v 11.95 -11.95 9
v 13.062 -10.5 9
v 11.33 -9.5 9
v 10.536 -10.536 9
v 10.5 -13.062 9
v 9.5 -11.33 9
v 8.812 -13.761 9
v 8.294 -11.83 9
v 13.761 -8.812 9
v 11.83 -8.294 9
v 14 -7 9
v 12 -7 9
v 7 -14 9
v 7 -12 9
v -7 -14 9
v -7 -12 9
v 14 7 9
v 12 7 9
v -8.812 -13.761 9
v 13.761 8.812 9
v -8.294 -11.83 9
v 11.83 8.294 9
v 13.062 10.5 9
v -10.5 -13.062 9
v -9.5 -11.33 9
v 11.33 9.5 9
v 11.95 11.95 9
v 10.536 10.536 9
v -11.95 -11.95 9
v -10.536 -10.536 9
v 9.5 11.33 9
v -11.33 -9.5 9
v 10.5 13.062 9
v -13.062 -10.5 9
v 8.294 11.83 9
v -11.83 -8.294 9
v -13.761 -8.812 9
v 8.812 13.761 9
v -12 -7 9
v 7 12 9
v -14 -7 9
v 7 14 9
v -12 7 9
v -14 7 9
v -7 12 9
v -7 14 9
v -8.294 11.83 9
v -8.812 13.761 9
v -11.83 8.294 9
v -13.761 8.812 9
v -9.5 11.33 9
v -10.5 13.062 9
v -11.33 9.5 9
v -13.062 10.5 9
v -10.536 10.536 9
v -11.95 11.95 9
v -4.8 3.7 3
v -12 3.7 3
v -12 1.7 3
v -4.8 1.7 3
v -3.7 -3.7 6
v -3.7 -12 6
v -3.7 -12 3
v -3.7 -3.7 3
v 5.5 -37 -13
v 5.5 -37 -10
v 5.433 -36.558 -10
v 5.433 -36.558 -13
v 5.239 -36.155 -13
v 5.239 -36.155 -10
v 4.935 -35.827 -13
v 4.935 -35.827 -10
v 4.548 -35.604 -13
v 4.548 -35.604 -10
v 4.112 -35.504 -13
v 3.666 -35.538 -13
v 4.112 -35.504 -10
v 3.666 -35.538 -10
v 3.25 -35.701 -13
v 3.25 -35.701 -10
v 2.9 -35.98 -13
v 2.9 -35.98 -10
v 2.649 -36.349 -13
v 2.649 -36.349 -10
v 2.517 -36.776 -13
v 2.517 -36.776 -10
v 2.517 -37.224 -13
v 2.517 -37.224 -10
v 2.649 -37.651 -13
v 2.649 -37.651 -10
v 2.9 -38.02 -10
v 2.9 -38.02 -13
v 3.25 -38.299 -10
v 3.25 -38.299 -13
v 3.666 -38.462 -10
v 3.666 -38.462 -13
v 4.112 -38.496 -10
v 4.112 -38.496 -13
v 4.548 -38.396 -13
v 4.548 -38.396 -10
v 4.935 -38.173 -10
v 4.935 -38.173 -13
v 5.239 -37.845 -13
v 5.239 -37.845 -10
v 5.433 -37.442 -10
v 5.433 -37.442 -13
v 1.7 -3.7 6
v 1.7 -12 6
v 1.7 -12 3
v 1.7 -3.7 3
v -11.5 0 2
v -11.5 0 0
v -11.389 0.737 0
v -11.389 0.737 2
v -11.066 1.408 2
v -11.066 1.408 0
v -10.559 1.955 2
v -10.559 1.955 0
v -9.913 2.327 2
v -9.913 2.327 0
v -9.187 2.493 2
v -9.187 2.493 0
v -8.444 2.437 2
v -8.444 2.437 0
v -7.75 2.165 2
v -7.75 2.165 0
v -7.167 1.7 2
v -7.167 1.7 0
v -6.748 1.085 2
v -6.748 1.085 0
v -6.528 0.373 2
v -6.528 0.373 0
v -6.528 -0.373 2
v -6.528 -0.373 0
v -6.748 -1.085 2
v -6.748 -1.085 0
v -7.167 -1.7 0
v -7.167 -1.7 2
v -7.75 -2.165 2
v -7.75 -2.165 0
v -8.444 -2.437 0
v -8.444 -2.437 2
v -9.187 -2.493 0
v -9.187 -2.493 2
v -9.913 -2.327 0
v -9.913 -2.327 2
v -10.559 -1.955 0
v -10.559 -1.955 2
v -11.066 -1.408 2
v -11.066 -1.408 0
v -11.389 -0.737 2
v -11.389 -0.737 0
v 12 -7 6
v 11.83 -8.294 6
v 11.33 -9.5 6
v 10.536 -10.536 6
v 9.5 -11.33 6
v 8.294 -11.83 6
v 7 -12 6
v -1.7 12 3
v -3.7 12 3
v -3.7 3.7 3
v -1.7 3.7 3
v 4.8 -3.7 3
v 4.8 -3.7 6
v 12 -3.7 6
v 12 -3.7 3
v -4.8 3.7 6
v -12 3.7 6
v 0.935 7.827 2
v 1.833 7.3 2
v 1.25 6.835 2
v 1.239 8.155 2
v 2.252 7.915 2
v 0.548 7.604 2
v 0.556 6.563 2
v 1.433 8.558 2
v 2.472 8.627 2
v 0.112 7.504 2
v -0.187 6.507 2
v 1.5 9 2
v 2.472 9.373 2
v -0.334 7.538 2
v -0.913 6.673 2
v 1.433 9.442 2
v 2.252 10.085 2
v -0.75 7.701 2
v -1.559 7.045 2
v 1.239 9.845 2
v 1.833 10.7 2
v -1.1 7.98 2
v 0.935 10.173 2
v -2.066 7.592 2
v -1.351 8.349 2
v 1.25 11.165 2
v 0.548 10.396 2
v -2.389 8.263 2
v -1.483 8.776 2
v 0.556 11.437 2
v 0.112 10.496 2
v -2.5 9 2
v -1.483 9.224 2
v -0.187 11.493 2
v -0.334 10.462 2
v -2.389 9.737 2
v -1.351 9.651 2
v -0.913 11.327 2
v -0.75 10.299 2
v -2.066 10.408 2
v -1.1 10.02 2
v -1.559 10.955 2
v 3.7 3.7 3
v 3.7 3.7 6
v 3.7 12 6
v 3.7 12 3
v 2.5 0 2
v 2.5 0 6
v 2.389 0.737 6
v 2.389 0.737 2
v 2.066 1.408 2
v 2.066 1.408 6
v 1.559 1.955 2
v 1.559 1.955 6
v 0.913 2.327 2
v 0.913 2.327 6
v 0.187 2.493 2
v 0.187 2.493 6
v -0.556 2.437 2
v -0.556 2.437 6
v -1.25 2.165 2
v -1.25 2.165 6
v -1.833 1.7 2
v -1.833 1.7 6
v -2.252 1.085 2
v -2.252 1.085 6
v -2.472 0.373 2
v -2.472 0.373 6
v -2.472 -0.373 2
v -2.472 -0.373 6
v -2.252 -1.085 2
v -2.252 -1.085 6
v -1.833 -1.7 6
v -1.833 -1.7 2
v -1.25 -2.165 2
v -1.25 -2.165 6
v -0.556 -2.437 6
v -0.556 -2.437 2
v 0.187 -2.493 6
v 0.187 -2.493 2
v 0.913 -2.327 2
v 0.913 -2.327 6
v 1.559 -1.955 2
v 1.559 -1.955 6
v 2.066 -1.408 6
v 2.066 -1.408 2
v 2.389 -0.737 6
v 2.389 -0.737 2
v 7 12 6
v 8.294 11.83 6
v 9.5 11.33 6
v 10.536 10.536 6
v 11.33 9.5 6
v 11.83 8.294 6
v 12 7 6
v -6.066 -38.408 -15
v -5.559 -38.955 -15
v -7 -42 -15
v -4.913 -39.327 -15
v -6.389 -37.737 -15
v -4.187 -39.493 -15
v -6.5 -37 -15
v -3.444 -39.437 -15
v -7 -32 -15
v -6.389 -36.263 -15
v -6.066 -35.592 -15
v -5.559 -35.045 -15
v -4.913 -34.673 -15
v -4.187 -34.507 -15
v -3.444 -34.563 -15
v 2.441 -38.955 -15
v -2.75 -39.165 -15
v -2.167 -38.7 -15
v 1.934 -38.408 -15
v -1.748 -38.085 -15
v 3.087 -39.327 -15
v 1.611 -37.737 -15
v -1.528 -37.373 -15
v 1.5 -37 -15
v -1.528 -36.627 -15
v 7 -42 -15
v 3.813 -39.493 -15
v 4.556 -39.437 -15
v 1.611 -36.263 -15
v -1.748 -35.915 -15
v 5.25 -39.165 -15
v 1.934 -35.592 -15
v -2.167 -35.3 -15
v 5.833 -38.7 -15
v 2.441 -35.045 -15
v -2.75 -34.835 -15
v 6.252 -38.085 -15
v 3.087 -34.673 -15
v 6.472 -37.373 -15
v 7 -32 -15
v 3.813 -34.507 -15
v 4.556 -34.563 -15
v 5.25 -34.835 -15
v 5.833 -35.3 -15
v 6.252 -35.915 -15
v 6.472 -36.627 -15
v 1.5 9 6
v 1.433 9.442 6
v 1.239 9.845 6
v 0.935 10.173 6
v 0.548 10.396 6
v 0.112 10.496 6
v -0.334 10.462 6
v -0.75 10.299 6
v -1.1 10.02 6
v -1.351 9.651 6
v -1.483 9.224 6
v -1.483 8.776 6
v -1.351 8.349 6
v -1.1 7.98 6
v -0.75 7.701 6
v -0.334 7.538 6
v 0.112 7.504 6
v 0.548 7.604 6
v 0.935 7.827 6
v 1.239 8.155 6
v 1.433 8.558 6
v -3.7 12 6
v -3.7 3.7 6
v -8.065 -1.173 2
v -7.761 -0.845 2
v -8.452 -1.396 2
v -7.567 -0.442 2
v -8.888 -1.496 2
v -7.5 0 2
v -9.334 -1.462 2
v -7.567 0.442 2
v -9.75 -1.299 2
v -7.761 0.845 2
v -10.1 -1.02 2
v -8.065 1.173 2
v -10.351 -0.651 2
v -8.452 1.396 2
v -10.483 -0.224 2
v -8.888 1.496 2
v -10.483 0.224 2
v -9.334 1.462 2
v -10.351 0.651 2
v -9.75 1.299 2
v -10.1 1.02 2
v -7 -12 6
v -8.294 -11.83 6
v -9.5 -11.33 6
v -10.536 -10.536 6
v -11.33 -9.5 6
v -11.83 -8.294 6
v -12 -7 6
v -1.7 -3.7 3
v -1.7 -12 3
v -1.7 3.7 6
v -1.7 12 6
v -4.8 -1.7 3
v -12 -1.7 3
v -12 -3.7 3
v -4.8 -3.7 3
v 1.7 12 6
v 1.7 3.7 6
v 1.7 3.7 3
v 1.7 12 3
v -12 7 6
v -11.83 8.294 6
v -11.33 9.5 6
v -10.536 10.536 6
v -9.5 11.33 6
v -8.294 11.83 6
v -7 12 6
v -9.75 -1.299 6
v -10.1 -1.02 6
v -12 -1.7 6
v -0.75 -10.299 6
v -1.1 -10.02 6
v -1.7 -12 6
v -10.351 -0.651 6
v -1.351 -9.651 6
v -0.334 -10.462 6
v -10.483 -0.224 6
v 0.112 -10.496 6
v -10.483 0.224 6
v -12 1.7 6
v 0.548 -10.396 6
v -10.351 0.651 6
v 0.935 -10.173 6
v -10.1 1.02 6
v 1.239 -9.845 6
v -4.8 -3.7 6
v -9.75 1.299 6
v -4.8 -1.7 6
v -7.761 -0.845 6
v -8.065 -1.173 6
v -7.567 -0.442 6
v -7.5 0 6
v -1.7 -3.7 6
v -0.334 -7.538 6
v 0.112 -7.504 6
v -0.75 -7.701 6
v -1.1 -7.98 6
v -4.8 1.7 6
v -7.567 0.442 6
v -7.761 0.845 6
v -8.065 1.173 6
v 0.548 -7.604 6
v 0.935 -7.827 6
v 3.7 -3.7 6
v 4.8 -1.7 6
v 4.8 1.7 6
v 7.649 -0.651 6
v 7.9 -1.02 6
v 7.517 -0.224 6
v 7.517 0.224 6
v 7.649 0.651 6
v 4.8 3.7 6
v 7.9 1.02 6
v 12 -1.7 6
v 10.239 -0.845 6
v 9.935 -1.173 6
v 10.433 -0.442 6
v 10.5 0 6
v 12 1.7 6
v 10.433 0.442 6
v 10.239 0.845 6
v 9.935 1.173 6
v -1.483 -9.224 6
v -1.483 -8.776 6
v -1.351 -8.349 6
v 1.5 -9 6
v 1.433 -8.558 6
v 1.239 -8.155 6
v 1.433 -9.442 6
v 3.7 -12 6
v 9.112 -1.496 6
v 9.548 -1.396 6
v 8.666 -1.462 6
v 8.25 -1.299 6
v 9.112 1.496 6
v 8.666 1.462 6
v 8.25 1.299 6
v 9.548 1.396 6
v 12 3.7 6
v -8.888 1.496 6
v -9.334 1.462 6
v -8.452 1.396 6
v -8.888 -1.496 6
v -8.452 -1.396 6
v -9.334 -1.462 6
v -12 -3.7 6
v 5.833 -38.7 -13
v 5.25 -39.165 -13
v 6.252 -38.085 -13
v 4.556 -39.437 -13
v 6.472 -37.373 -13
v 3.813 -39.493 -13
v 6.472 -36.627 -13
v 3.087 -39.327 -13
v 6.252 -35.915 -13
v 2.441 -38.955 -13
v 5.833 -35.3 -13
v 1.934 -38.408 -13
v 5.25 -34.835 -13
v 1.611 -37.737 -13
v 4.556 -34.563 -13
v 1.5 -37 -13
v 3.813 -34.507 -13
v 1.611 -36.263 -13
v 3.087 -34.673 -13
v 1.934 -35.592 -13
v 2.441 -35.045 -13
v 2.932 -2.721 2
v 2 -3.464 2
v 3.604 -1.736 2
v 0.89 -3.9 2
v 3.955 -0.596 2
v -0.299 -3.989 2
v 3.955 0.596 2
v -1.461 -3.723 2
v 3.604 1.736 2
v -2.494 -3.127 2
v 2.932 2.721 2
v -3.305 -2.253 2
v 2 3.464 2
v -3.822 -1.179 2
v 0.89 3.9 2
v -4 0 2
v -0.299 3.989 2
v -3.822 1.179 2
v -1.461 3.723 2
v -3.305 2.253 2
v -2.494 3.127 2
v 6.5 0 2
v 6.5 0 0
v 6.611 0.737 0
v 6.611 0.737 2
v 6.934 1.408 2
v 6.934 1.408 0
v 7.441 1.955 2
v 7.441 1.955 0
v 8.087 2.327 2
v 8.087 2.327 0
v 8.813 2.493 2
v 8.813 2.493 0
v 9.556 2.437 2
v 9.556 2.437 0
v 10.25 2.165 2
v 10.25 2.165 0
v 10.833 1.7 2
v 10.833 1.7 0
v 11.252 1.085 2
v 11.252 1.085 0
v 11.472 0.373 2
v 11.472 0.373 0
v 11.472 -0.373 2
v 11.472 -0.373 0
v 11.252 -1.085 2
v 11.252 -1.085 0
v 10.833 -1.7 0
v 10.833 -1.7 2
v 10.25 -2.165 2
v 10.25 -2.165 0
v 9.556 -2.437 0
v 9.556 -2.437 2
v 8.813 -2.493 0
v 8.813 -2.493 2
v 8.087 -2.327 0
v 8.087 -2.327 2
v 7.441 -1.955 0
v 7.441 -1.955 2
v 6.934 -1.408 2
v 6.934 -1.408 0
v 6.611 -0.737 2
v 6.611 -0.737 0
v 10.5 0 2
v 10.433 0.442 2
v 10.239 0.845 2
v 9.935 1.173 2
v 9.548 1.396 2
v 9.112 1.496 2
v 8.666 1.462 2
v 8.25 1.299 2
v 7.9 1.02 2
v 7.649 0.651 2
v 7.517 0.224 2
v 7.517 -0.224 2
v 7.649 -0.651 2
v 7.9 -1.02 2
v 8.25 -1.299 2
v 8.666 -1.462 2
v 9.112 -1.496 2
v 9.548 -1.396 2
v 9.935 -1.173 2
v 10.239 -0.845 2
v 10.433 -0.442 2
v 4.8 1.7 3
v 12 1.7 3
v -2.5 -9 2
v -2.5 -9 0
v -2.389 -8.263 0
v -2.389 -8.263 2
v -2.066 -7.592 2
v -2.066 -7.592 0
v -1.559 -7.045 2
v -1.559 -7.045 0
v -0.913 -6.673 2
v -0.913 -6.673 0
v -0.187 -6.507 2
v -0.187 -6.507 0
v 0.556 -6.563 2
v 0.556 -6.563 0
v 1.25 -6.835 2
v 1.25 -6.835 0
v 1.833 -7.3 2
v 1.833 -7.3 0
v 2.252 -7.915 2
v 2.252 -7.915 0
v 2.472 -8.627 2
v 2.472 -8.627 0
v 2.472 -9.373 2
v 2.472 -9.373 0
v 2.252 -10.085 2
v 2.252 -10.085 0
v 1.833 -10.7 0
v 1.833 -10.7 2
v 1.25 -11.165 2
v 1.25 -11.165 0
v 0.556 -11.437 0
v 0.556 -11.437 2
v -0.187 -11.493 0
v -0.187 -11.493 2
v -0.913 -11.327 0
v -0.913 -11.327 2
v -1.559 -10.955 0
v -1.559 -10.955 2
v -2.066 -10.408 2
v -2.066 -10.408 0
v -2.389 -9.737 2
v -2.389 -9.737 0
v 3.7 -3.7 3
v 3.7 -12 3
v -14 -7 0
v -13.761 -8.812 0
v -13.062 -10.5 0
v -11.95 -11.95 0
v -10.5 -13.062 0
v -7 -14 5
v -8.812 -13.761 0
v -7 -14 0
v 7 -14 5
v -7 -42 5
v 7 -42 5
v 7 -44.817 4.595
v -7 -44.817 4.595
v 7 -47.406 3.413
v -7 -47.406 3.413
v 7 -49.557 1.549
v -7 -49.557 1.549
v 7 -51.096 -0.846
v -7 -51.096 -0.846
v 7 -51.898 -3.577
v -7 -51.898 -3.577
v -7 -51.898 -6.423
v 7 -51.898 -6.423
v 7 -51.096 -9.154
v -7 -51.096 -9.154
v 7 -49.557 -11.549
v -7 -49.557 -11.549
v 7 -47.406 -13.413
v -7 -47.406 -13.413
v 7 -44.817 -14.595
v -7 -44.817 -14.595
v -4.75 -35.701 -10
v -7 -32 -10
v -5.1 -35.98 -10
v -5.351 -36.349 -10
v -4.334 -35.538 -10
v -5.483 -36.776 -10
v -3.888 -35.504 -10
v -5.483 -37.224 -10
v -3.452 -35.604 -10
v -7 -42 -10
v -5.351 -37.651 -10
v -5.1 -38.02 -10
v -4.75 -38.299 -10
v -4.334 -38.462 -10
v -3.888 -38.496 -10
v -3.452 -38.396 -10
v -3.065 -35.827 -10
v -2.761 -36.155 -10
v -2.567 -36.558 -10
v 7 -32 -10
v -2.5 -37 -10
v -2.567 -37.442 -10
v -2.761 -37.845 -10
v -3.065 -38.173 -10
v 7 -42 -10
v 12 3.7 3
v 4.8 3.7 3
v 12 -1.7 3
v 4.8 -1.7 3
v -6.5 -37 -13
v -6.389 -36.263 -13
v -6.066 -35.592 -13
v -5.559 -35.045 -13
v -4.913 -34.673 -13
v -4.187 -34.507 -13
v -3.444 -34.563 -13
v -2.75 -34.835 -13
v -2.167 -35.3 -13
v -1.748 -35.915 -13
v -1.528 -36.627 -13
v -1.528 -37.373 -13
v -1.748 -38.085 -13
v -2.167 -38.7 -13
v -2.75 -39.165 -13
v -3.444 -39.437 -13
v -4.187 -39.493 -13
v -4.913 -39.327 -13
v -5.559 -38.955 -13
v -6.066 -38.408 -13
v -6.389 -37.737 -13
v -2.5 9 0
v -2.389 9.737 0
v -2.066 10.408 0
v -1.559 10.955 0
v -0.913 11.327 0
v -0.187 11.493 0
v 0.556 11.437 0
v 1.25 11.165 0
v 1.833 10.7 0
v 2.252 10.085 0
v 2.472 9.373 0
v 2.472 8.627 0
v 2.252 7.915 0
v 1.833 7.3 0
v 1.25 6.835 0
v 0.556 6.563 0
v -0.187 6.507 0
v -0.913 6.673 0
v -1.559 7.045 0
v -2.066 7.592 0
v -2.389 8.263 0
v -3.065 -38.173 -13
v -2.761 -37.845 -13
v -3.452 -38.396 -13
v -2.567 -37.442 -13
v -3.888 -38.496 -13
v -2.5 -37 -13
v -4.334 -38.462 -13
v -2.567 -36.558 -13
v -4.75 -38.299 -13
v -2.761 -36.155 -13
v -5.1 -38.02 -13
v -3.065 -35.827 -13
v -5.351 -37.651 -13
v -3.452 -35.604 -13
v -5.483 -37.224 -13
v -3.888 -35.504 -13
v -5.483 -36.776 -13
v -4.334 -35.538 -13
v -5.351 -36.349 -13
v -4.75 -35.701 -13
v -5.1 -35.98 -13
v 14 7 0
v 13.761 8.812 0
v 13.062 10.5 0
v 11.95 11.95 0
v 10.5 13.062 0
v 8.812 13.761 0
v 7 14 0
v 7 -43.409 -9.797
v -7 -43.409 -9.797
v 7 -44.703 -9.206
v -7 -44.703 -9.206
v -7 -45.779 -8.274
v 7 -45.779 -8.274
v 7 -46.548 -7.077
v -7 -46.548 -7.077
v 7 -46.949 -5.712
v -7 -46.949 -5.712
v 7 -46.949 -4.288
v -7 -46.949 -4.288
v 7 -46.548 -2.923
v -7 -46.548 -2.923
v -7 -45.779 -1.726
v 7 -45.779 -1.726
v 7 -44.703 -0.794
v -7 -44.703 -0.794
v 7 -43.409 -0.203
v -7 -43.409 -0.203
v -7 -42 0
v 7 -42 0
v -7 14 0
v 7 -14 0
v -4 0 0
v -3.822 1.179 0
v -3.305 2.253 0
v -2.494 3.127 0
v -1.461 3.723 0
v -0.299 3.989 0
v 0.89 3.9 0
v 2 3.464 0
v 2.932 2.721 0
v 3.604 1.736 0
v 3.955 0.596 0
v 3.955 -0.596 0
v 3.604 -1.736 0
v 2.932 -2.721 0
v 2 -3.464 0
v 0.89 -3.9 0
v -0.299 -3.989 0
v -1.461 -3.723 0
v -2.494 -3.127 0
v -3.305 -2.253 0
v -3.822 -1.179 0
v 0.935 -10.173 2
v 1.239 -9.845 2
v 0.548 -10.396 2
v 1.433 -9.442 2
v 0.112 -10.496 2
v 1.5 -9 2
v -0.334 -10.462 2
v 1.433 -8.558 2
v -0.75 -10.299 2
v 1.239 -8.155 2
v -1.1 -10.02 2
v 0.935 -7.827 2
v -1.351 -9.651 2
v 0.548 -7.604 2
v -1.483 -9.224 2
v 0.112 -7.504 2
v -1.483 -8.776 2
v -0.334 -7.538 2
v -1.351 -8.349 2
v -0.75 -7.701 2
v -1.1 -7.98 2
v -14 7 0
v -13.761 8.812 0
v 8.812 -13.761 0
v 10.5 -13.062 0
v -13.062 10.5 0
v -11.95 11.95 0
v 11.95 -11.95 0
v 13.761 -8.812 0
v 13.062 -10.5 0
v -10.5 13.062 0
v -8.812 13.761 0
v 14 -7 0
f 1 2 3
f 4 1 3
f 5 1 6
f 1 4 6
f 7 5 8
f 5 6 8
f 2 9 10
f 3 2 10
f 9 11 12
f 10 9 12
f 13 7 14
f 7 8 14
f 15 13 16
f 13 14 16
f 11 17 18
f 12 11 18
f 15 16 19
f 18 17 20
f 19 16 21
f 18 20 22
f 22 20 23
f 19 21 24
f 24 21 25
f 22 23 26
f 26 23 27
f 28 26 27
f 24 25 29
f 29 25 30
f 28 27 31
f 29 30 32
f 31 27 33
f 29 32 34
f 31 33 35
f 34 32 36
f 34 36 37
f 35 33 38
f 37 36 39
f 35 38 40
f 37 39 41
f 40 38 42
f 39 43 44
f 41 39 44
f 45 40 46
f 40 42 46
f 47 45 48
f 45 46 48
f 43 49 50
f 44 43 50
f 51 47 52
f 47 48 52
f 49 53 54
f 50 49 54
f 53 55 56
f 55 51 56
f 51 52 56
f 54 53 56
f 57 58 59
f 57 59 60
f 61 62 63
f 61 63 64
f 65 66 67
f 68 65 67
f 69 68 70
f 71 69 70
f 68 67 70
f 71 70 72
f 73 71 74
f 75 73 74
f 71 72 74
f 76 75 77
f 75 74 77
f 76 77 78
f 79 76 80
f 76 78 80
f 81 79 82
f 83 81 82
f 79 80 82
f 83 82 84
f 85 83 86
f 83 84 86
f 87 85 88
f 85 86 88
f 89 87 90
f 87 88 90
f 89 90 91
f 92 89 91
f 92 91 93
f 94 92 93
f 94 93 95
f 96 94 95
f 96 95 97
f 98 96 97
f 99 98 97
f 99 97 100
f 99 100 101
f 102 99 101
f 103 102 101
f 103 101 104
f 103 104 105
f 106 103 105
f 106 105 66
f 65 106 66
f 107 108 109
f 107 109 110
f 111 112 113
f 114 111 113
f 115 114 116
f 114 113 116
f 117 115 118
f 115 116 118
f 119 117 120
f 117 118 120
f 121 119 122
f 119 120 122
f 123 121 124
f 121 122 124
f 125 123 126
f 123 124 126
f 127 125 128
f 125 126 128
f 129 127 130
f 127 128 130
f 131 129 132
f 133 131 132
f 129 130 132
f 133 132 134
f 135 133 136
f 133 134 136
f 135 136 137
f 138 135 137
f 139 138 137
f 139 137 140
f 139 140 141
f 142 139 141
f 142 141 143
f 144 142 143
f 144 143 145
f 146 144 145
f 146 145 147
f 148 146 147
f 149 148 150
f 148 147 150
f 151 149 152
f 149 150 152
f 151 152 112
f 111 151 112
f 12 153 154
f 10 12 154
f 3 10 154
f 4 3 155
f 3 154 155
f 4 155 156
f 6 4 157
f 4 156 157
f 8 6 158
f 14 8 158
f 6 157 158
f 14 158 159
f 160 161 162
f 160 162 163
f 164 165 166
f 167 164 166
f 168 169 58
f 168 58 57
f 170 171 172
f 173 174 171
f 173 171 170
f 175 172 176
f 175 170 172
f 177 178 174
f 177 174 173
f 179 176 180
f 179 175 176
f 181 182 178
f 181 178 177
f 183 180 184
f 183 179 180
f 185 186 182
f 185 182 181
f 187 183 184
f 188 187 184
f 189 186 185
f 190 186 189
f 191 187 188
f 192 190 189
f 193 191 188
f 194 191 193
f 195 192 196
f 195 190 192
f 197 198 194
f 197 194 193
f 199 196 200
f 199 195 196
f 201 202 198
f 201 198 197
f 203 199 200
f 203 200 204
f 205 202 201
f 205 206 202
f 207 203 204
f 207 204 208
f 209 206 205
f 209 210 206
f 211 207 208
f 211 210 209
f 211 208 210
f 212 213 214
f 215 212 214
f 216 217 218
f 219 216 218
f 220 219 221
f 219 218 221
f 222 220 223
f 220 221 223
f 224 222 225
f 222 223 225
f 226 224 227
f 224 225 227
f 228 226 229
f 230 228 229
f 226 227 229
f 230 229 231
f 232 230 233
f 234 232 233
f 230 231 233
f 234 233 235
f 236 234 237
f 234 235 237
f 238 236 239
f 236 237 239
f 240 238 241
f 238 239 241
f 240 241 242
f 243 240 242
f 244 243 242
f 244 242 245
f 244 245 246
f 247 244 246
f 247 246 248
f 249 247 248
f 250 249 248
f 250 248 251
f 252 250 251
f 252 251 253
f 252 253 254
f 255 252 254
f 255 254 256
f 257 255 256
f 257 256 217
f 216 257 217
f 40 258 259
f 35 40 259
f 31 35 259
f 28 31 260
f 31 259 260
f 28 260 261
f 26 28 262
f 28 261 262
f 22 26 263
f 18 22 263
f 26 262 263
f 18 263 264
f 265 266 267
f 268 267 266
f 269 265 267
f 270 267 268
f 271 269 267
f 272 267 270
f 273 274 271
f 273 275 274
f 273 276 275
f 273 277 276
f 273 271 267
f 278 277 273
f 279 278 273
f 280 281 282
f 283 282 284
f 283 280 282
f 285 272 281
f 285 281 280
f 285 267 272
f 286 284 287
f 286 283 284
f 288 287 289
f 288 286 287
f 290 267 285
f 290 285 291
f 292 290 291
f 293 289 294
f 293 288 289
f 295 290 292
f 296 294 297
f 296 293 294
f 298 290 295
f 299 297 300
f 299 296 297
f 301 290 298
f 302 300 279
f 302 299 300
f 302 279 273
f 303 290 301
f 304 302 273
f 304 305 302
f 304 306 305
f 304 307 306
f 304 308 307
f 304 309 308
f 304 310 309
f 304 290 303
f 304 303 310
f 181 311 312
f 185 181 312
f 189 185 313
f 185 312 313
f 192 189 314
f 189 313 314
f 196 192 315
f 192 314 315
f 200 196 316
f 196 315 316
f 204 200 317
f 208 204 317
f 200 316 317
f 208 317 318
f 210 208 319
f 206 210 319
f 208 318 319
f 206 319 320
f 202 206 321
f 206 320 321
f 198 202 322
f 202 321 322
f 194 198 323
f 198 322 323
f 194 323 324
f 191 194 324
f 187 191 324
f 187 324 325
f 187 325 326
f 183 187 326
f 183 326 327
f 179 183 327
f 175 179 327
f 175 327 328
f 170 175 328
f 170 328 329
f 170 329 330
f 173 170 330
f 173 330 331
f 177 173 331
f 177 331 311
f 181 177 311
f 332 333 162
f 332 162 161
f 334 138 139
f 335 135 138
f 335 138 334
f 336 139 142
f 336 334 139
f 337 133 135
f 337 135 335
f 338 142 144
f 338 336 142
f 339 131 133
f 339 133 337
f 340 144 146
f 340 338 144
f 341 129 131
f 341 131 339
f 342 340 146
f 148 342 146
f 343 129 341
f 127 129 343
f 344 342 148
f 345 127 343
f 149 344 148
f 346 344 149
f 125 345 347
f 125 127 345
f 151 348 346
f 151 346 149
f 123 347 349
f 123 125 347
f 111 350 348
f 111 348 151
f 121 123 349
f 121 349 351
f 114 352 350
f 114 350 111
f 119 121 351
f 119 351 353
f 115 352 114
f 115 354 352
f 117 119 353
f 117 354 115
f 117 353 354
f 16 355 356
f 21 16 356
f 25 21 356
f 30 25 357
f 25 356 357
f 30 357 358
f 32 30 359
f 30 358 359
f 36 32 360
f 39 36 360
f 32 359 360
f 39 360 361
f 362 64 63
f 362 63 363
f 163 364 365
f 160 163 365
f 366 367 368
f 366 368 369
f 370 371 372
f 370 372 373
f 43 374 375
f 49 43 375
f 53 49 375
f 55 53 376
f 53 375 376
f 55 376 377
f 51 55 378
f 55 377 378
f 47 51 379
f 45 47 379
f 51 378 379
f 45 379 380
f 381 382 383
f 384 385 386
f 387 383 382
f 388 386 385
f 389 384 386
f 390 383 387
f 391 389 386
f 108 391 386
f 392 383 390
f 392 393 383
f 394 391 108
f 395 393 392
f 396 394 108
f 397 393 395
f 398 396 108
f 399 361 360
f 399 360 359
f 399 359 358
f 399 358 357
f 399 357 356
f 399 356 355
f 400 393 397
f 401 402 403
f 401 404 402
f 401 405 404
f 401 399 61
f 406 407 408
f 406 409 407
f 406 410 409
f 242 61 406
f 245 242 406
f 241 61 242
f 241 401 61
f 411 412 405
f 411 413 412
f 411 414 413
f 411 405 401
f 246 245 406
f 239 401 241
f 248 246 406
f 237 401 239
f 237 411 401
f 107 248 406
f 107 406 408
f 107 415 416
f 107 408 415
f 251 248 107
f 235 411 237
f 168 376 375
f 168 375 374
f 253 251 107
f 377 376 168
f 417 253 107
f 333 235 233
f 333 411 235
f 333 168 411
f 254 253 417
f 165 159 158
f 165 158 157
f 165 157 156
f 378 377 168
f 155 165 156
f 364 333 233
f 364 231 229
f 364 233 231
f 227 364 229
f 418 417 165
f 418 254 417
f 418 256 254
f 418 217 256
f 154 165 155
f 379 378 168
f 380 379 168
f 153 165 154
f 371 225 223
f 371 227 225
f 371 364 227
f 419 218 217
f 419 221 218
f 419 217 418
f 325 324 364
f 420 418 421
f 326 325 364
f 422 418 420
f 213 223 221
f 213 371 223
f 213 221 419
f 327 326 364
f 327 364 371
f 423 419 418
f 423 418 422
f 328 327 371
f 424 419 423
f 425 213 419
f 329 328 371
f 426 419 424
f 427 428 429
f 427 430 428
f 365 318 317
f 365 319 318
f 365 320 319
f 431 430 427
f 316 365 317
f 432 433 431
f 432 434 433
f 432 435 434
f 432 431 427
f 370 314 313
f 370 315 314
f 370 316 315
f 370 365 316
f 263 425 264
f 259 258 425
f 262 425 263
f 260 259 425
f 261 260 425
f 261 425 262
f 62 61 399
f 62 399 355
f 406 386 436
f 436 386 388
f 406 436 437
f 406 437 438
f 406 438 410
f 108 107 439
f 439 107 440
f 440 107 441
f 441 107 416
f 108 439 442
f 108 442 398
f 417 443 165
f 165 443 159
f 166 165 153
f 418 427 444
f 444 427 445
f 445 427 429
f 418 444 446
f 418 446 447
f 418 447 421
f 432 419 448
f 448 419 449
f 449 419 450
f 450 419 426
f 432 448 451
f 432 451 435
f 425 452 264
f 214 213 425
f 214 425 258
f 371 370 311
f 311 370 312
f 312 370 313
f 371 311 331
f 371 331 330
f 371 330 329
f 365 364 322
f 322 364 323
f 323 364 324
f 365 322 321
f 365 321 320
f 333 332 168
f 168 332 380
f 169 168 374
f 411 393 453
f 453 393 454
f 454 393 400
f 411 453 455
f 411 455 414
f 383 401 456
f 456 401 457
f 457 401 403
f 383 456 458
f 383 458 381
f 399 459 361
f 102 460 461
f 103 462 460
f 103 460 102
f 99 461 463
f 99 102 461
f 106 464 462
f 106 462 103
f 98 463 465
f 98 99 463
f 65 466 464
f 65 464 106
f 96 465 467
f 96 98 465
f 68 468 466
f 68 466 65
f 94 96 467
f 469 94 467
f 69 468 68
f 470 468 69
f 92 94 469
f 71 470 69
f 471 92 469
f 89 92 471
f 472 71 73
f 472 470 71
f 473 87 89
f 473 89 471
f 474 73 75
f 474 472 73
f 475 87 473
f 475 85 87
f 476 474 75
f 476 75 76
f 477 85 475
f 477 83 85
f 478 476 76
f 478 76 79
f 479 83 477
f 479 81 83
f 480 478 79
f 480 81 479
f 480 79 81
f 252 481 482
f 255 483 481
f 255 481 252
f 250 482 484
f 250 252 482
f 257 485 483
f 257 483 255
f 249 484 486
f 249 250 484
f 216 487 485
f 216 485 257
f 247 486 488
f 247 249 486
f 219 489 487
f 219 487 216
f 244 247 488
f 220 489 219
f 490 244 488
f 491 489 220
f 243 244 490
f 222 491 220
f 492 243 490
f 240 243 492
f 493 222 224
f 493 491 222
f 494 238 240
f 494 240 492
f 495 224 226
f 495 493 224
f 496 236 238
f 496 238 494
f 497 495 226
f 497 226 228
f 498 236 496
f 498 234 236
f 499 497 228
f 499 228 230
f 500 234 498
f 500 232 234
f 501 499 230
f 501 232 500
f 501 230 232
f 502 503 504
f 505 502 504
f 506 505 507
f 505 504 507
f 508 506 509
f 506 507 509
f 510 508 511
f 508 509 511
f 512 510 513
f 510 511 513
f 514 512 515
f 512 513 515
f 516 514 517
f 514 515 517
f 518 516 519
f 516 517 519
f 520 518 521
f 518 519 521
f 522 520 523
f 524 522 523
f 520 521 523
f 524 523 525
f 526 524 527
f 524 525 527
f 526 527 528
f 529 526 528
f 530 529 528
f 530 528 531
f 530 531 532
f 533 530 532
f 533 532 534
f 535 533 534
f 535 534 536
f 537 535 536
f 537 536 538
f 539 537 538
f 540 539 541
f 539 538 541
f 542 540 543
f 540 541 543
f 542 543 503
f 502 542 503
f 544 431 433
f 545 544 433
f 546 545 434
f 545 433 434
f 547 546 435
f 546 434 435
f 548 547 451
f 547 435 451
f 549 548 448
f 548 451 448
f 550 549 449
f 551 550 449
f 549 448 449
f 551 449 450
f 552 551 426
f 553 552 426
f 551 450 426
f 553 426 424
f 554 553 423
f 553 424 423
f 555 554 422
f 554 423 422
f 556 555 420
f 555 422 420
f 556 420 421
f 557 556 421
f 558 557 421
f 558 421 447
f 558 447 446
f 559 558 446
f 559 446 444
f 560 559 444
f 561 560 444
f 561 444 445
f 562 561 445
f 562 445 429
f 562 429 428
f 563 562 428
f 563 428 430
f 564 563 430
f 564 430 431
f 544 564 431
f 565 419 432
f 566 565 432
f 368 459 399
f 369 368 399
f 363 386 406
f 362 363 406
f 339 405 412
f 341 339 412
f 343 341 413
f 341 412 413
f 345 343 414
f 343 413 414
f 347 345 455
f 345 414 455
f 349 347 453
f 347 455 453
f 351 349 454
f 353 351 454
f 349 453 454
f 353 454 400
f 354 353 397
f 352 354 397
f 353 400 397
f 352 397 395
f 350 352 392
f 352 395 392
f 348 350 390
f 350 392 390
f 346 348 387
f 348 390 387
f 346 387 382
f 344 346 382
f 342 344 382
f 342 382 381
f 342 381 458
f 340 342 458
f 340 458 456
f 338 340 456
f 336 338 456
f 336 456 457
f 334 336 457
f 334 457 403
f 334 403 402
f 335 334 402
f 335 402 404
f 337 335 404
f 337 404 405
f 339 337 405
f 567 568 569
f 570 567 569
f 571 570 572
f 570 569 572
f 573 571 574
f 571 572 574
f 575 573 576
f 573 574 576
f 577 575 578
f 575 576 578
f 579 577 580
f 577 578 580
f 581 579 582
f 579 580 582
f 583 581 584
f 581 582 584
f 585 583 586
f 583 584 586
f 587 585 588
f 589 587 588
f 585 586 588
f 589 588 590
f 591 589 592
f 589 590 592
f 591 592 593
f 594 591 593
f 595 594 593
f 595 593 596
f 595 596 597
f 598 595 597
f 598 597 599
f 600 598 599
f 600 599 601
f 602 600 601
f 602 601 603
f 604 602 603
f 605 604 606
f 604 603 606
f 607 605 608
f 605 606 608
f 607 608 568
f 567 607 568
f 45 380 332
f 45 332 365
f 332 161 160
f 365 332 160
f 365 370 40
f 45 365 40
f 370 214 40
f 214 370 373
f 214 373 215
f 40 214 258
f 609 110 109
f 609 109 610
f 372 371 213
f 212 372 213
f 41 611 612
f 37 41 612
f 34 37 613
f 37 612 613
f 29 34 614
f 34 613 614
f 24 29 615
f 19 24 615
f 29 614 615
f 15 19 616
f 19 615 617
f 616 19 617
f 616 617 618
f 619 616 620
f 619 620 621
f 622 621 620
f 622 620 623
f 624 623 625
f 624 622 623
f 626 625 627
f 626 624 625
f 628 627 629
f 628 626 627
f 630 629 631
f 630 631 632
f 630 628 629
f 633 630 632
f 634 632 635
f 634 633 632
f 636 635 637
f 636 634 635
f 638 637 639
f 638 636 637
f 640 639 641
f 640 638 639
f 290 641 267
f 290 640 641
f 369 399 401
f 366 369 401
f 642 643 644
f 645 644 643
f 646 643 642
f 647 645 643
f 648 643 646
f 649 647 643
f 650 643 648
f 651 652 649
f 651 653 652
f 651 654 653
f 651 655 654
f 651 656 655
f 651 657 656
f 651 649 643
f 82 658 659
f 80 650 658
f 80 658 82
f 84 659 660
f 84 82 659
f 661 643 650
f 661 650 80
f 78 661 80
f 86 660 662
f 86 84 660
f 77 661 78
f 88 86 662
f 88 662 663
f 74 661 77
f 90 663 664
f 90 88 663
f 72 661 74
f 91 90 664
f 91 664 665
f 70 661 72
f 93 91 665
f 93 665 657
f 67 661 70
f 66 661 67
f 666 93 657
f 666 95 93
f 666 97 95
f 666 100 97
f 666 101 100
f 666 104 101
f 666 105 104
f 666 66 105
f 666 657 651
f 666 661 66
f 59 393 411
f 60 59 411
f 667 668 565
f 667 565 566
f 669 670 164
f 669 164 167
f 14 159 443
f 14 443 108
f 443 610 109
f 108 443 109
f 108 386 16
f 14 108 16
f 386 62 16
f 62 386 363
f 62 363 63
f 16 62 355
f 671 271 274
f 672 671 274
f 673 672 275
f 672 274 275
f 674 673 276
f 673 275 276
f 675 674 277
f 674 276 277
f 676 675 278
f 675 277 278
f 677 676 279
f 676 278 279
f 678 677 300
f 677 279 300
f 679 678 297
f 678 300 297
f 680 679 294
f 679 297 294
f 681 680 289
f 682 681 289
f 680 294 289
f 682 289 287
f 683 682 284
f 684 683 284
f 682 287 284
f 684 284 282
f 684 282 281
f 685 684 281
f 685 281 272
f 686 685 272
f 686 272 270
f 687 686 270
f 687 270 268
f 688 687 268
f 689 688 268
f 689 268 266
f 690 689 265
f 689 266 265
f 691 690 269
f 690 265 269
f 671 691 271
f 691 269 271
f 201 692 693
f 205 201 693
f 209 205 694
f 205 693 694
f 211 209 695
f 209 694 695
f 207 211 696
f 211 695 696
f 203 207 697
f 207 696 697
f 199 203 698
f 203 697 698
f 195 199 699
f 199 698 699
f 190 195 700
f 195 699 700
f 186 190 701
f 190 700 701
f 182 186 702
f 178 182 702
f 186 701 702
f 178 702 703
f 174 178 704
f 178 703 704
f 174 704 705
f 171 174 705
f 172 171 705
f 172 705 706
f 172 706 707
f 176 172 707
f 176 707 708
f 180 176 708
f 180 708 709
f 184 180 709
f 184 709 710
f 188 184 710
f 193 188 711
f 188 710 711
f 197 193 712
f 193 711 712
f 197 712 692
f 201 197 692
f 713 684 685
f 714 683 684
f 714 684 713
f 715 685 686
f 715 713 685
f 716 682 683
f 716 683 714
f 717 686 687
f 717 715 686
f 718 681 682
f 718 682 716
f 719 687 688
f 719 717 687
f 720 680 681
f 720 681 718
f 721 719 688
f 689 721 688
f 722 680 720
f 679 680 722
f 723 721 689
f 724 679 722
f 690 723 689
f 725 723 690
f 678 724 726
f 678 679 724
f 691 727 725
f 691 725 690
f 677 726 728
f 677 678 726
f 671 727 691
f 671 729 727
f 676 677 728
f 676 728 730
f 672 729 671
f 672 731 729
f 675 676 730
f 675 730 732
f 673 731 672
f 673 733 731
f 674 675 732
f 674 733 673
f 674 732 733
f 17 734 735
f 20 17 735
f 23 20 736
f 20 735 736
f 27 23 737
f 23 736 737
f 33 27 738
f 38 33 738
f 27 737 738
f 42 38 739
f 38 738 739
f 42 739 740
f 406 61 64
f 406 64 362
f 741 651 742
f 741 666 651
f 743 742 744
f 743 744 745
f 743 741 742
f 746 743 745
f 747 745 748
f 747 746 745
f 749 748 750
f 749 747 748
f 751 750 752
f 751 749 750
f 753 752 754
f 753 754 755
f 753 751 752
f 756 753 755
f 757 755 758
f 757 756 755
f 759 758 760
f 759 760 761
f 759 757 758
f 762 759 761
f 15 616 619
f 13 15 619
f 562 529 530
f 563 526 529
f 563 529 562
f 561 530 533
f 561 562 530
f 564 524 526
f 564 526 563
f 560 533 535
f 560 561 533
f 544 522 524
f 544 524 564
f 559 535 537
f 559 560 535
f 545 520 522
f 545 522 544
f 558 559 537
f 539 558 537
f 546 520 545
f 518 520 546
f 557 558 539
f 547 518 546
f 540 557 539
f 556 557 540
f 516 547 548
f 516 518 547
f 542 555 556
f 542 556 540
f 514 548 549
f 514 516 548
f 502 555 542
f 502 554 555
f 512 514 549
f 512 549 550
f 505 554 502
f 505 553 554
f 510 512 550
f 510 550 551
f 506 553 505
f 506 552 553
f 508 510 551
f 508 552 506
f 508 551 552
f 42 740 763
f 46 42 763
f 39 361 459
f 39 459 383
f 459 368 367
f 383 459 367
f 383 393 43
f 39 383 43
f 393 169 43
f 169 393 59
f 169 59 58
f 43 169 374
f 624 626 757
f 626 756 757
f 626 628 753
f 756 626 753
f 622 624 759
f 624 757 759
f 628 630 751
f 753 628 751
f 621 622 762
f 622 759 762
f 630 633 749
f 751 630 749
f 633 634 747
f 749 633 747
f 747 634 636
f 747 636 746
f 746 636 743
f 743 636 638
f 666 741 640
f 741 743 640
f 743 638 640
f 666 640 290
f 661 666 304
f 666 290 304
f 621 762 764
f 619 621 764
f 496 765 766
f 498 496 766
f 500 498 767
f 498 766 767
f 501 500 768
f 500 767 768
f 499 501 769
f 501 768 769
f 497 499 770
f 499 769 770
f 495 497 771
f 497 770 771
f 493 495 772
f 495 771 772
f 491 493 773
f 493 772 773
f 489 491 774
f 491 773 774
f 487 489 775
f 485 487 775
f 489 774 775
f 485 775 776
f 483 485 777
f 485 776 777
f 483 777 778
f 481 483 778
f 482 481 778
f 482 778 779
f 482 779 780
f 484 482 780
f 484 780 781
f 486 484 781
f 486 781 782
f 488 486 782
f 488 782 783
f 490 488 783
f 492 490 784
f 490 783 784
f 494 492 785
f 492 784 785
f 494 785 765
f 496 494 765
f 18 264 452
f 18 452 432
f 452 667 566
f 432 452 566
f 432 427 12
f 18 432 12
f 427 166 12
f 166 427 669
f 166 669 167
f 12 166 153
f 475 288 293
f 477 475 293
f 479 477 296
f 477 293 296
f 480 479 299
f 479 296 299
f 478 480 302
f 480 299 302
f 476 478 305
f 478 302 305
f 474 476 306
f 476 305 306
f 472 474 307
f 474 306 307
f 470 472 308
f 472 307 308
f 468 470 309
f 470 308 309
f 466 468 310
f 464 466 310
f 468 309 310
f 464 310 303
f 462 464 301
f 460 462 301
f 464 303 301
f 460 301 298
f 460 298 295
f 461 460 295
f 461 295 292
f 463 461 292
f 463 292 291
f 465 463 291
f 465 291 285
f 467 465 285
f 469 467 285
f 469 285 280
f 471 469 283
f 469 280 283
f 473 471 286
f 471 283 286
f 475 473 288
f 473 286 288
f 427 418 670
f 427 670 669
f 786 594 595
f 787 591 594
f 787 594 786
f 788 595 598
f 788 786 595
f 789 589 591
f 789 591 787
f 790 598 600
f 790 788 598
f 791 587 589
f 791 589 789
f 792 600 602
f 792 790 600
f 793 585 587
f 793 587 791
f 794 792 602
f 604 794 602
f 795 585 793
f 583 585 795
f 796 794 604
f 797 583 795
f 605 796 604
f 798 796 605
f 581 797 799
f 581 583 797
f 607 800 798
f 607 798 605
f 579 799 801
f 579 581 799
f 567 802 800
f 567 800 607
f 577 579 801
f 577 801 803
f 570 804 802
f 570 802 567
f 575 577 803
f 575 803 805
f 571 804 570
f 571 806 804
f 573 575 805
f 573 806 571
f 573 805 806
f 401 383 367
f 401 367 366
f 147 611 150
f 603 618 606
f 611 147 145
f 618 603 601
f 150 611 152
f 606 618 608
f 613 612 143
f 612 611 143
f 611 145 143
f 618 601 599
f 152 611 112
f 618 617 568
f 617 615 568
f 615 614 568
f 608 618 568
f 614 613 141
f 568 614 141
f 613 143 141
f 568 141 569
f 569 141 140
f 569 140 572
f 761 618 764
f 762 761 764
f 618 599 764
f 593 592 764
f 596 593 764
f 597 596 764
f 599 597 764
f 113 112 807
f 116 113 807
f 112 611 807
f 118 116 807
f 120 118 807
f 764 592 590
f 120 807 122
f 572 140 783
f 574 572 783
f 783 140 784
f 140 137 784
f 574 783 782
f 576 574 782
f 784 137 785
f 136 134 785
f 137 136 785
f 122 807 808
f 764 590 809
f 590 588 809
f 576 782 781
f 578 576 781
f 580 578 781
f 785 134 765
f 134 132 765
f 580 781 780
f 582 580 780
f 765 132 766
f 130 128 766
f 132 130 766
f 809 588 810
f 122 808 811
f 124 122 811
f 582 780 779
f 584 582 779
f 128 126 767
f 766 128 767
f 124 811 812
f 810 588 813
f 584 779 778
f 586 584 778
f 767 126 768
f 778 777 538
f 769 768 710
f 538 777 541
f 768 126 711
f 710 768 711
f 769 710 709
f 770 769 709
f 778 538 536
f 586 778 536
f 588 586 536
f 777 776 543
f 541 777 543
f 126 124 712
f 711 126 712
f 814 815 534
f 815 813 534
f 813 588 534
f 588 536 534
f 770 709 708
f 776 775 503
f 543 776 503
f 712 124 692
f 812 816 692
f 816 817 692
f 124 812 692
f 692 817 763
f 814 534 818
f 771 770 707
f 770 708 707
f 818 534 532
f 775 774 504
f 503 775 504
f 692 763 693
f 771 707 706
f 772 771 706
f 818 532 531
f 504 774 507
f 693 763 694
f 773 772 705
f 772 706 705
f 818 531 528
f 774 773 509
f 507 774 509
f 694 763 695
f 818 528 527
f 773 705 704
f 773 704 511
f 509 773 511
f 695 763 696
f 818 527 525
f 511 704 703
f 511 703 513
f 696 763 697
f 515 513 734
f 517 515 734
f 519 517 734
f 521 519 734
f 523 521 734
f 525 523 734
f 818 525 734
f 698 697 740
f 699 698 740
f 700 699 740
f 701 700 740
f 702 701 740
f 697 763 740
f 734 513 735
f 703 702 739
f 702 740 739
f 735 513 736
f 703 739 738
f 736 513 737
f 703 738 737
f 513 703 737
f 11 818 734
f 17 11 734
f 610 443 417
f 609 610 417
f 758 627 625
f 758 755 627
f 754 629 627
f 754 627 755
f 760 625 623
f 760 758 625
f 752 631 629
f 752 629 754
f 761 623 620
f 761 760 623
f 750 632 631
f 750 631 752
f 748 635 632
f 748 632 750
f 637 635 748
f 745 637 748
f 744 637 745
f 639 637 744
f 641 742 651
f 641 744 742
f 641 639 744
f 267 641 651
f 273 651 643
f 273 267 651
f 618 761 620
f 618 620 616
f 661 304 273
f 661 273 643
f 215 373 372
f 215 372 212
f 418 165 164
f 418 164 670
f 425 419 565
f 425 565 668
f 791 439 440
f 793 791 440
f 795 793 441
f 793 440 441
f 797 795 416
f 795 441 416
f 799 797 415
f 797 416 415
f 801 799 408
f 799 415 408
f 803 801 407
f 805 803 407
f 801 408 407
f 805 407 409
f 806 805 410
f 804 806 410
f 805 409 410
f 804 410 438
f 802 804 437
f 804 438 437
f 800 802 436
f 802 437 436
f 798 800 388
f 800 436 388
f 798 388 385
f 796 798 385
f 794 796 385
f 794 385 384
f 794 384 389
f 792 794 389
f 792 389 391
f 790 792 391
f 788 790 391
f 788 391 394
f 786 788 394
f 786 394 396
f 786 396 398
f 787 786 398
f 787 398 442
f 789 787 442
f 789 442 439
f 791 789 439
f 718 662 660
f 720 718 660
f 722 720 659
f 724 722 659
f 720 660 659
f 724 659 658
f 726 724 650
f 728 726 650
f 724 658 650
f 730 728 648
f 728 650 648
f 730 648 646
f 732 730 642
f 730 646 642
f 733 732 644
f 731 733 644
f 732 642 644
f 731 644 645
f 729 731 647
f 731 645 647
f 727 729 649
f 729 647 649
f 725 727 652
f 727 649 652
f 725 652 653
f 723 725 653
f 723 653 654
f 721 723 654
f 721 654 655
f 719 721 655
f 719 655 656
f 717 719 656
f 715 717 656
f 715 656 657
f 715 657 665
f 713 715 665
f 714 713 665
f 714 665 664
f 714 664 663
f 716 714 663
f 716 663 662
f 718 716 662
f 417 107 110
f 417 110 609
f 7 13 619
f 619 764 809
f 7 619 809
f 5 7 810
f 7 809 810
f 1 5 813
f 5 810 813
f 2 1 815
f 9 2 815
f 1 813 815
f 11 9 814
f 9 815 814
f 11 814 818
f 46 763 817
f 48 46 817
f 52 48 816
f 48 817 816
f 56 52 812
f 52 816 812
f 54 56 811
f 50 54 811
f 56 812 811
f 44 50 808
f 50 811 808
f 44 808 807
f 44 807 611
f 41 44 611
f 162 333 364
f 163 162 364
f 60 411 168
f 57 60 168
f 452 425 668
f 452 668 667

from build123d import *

# Parameters (mm, degrees)
Y_KSEKLIK_EKSTR_ZYON1_DEPTH = 9
Y_KSEKLIK_EKSTR_ZYON2_DEPTH = 6
IZIM4_R                     = 1.5
IZIM4_R_2                   = 2.5
KES_EKSTR_ZYON2_DEPTH       = 6.5
IZIM5_W                     = 14
IZIM5_H                     = 15
Y_KSEKLIK_EKSTR_ZYON3_DEPTH = 5
Y_KSEKLIK_EKSTR_ZYON4_DEPTH = 7
IZIM3_W                     = 7.2
IZIM3_H                     = 2
IZIM3_W_2                   = 2
IZIM3_H_2                   = 8.3
KES_EKSTR_ZYON3_DEPTH       = 3
IZIM8_R                     = 1.5
KES_EKSTR_ZYON5_DEPTH       = 10
IZIM9_R                     = 2.5
IZIM9_R_2                   = 4
KES_EKSTR_ZYON6_DEPTH       = 2
IZIM11_R                    = 2.5
KES_EKSTR_ZYON8_DEPTH       = 2
KES_EKSTR_ZYON9_START       = -10
KES_EKSTR_ZYON9_DEPTH       = 10
IZIM14_W                    = 14
IZIM14_H                    = 3
Y_KSEKLIK_EKSTR_ZYON5_DEPTH = 5


with BuildPart() as part:
    # Çizim1 → Yükseklik-Ekstrüzyon1 (new body)
    with BuildSketch(Plane.XY):
        with BuildLine():
            Line((17, 7), (17, -7))
            ThreePointArc((17, -7), (14.071067812, -14.071067812), (7, -17))
            Line((7, -17), (-7, -17))
            ThreePointArc((-7, -17), (-14.071067812, -14.071067812), (-17, -7))
            Line((-17, -7), (-17, 7))
            ThreePointArc((-17, 7), (-14.071067812, 14.071067812), (-7, 17))
            Line((-7, 17), (7, 17))
            ThreePointArc((7, 17), (14.071067812, 14.071067812), (17, 7))
        make_face()
        with BuildLine():
            Line((-7, 12), (7, 12))
            ThreePointArc((7, 12), (10.535533906, 10.535533906), (12, 7))
            Line((12, 7), (12, -7))
            ThreePointArc((12, -7), (10.535533906, -10.535533906), (7, -12))
            Line((7, -12), (-7, -12))
            ThreePointArc((-7, -12), (-10.535533906, -10.535533906), (-12, -7))
            Line((-12, -7), (-12, 7))
            ThreePointArc((-12, 7), (-10.535533906, 10.535533906), (-7, 12))
        make_face(mode=Mode.SUBTRACT)
    extrude(amount=Y_KSEKLIK_EKSTR_ZYON1_DEPTH)

    # Çizim2 → Yükseklik-Ekstrüzyon2 (add)
    with BuildSketch(Plane.XY):
        with BuildLine():
            Line((-7, -12), (7, -12))
            ThreePointArc((7, -12), (10.535533906, -10.535533906), (12, -7))
            Line((12, -7), (12, 7))
            ThreePointArc((12, 7), (10.535533906, 10.535533906), (7, 12))
            Line((7, 12), (-7, 12))
            ThreePointArc((-7, 12), (-10.535533906, 10.535533906), (-12, 7))
            Line((-12, 7), (-12, -7))
            ThreePointArc((-12, -7), (-10.535533906, -10.535533906), (-7, -12))
        make_face()
    extrude(amount=Y_KSEKLIK_EKSTR_ZYON2_DEPTH)

    # Çizim4 → Kes-Ekstrüzyon2 (cut)
    with BuildSketch(Plane.XY.offset(6)):
        with Locations((0, 9)):
            Circle(IZIM4_R)
        Circle(IZIM4_R_2)
        with Locations((9, 0)):
            Circle(IZIM4_R)
        with Locations((0, -9)):
            Circle(IZIM4_R)
        with Locations((-9, 0)):
            Circle(IZIM4_R)
    extrude(amount=-KES_EKSTR_ZYON2_DEPTH, mode=Mode.SUBTRACT)

    # Çizim5 → Yükseklik-Ekstrüzyon3 (add)
    with BuildSketch(Plane.XY):
        with Locations((0, -24.5)):
            Rectangle(IZIM5_W, IZIM5_H)
    extrude(amount=Y_KSEKLIK_EKSTR_ZYON3_DEPTH)

    # Çizim6 → Yükseklik-Ekstrüzyon4 (add, symmetric)
    with BuildSketch(Plane(origin=(0, 0, 0), x_dir=(0, 0, -1), z_dir=(1, 0, 0))):
        with BuildLine():
            Line((0, -32), (-5, -32))
            Line((-5, -32), (-5, -42))
            ThreePointArc((-5, -42), (5, -52), (15, -42))
            Line((15, -42), (15, -32))
            Line((15, -32), (10, -32))
            Line((10, -32), (10, -42))
            ThreePointArc((10, -42), (5, -47), (0, -42))
            Line((0, -42), (0, -32))
        make_face()
    extrude(amount=Y_KSEKLIK_EKSTR_ZYON4_DEPTH, both=True)

    # Çizim3 → Kes-Ekstrüzyon3 (cut)
    with BuildSketch(Plane.XY.offset(6)):
        with Locations((8.4, 2.7)):
            Rectangle(IZIM3_W, IZIM3_H)
        with Locations((2.7, 7.85)):
            Rectangle(IZIM3_W_2, IZIM3_H_2)
        with Locations((-2.7, 7.85)):
            Rectangle(IZIM3_W_2, IZIM3_H_2)
        with Locations((-8.4, 2.7)):
            Rectangle(IZIM3_W, IZIM3_H)
        with Locations((-8.4, -2.7)):
            Rectangle(IZIM3_W, IZIM3_H)
        with Locations((-2.7, -7.85)):
            Rectangle(IZIM3_W_2, IZIM3_H_2)
        with Locations((2.7, -7.85)):
            Rectangle(IZIM3_W_2, IZIM3_H_2)
        with Locations((8.4, -2.7)):
            Rectangle(IZIM3_W, IZIM3_H)
    extrude(amount=-KES_EKSTR_ZYON3_DEPTH, mode=Mode.SUBTRACT)

    # Çizim8 → Kes-Ekstrüzyon5 (cut)
    with BuildSketch(Plane.XY.offset(-10)):
        with Locations((-4, -37)):
            Circle(IZIM8_R)
        with Locations((4, -37)):
            Circle(IZIM8_R)
    extrude(amount=-KES_EKSTR_ZYON5_DEPTH, mode=Mode.SUBTRACT)

    # Çizim9 → Kes-Ekstrüzyon6 (cut)
    with BuildSketch(Plane(origin=(0, 0, 0), x_dir=(-1, 0, 0), z_dir=(0, 0, -1))):
        with Locations((0, 9)):
            Circle(IZIM9_R)
        Circle(IZIM9_R_2)
        with Locations((9, 0)):
            Circle(IZIM9_R)
        with Locations((0, -9)):
            Circle(IZIM9_R)
        with Locations((-9, 0)):
            Circle(IZIM9_R)
    extrude(amount=-KES_EKSTR_ZYON6_DEPTH, mode=Mode.SUBTRACT)

    # Çizim11 → Kes-Ekstrüzyon8 (cut)
    with BuildSketch(Plane(origin=(0, 0, -15), x_dir=(-1, 0, 0), z_dir=(0, 0, -1))):
        with Locations((-4, -37)):
            Circle(IZIM11_R)
        with Locations((4, -37)):
            Circle(IZIM11_R)
    extrude(amount=-KES_EKSTR_ZYON8_DEPTH, mode=Mode.SUBTRACT)

    # Çizim12 → Kes-Ekstrüzyon9 (cut)
    with BuildSketch(Plane.XY.offset(9).offset(KES_EKSTR_ZYON9_START)):
        with BuildLine():
            Line((7, 17), (-7, 17))
            ThreePointArc((-7, 17), (-14.071067812, 14.071067812), (-17, 7))
            Line((-17, 7), (-17, -7))
            ThreePointArc((-17, -7), (-14.071067812, -14.071067812), (-7, -17))
            Line((-7, -17), (7, -17))
            ThreePointArc((7, -17), (14.071067812, -14.071067812), (17, -7))
            Line((17, -7), (17, 7))
            ThreePointArc((17, 7), (14.071067812, 14.071067812), (7, 17))
        make_face()
        with BuildLine():
            Line((7, 14), (-7, 14))
            ThreePointArc((-7, 14), (-11.949747468, 11.949747468), (-14, 7))
            Line((-14, 7), (-14, -7))
            ThreePointArc((-14, -7), (-11.949747468, -11.949747468), (-7, -14))
            Line((-7, -14), (7, -14))
            ThreePointArc((7, -14), (11.949747468, -11.949747468), (14, -7))
            Line((14, -7), (14, 7))
            ThreePointArc((14, 7), (11.949747468, 11.949747468), (7, 14))
        make_face(mode=Mode.SUBTRACT)
    extrude(amount=KES_EKSTR_ZYON9_DEPTH, mode=Mode.SUBTRACT)


with BuildPart() as kes_ekstr_zyon9_piece_1:
    # of the separate pieces the step leaves, piece 1, a body of its own (kes_ekstr_zyon9_pieces)
    add(part.part.solids().sort_by_distance((7, 14, 0))[0])



with BuildPart() as kes_ekstr_zyon9_piece_2:
    # of the separate pieces the step leaves, piece 2, a body of its own (kes_ekstr_zyon9_pieces)
    add(part.part.solids().sort_by_distance((-7, -42, 0))[0])


with BuildPart() as kes_ekstr_zyon9_piece_1_1:
    add(kes_ekstr_zyon9_piece_1.part)

    add(kes_ekstr_zyon9_piece_2.part)  # Yükseklik-Ekstrüzyon5 merges Kes-Ekstrüzyon9 piece 2
    # Çizim14 → Yükseklik-Ekstrüzyon5 (add)
    with BuildSketch(Plane.XY):
        with Locations((0, -15.5)):
            Rectangle(IZIM14_W, IZIM14_H)
    extrude(amount=Y_KSEKLIK_EKSTR_ZYON5_DEPTH)


solid = kes_ekstr_zyon9_piece_1_1.part
